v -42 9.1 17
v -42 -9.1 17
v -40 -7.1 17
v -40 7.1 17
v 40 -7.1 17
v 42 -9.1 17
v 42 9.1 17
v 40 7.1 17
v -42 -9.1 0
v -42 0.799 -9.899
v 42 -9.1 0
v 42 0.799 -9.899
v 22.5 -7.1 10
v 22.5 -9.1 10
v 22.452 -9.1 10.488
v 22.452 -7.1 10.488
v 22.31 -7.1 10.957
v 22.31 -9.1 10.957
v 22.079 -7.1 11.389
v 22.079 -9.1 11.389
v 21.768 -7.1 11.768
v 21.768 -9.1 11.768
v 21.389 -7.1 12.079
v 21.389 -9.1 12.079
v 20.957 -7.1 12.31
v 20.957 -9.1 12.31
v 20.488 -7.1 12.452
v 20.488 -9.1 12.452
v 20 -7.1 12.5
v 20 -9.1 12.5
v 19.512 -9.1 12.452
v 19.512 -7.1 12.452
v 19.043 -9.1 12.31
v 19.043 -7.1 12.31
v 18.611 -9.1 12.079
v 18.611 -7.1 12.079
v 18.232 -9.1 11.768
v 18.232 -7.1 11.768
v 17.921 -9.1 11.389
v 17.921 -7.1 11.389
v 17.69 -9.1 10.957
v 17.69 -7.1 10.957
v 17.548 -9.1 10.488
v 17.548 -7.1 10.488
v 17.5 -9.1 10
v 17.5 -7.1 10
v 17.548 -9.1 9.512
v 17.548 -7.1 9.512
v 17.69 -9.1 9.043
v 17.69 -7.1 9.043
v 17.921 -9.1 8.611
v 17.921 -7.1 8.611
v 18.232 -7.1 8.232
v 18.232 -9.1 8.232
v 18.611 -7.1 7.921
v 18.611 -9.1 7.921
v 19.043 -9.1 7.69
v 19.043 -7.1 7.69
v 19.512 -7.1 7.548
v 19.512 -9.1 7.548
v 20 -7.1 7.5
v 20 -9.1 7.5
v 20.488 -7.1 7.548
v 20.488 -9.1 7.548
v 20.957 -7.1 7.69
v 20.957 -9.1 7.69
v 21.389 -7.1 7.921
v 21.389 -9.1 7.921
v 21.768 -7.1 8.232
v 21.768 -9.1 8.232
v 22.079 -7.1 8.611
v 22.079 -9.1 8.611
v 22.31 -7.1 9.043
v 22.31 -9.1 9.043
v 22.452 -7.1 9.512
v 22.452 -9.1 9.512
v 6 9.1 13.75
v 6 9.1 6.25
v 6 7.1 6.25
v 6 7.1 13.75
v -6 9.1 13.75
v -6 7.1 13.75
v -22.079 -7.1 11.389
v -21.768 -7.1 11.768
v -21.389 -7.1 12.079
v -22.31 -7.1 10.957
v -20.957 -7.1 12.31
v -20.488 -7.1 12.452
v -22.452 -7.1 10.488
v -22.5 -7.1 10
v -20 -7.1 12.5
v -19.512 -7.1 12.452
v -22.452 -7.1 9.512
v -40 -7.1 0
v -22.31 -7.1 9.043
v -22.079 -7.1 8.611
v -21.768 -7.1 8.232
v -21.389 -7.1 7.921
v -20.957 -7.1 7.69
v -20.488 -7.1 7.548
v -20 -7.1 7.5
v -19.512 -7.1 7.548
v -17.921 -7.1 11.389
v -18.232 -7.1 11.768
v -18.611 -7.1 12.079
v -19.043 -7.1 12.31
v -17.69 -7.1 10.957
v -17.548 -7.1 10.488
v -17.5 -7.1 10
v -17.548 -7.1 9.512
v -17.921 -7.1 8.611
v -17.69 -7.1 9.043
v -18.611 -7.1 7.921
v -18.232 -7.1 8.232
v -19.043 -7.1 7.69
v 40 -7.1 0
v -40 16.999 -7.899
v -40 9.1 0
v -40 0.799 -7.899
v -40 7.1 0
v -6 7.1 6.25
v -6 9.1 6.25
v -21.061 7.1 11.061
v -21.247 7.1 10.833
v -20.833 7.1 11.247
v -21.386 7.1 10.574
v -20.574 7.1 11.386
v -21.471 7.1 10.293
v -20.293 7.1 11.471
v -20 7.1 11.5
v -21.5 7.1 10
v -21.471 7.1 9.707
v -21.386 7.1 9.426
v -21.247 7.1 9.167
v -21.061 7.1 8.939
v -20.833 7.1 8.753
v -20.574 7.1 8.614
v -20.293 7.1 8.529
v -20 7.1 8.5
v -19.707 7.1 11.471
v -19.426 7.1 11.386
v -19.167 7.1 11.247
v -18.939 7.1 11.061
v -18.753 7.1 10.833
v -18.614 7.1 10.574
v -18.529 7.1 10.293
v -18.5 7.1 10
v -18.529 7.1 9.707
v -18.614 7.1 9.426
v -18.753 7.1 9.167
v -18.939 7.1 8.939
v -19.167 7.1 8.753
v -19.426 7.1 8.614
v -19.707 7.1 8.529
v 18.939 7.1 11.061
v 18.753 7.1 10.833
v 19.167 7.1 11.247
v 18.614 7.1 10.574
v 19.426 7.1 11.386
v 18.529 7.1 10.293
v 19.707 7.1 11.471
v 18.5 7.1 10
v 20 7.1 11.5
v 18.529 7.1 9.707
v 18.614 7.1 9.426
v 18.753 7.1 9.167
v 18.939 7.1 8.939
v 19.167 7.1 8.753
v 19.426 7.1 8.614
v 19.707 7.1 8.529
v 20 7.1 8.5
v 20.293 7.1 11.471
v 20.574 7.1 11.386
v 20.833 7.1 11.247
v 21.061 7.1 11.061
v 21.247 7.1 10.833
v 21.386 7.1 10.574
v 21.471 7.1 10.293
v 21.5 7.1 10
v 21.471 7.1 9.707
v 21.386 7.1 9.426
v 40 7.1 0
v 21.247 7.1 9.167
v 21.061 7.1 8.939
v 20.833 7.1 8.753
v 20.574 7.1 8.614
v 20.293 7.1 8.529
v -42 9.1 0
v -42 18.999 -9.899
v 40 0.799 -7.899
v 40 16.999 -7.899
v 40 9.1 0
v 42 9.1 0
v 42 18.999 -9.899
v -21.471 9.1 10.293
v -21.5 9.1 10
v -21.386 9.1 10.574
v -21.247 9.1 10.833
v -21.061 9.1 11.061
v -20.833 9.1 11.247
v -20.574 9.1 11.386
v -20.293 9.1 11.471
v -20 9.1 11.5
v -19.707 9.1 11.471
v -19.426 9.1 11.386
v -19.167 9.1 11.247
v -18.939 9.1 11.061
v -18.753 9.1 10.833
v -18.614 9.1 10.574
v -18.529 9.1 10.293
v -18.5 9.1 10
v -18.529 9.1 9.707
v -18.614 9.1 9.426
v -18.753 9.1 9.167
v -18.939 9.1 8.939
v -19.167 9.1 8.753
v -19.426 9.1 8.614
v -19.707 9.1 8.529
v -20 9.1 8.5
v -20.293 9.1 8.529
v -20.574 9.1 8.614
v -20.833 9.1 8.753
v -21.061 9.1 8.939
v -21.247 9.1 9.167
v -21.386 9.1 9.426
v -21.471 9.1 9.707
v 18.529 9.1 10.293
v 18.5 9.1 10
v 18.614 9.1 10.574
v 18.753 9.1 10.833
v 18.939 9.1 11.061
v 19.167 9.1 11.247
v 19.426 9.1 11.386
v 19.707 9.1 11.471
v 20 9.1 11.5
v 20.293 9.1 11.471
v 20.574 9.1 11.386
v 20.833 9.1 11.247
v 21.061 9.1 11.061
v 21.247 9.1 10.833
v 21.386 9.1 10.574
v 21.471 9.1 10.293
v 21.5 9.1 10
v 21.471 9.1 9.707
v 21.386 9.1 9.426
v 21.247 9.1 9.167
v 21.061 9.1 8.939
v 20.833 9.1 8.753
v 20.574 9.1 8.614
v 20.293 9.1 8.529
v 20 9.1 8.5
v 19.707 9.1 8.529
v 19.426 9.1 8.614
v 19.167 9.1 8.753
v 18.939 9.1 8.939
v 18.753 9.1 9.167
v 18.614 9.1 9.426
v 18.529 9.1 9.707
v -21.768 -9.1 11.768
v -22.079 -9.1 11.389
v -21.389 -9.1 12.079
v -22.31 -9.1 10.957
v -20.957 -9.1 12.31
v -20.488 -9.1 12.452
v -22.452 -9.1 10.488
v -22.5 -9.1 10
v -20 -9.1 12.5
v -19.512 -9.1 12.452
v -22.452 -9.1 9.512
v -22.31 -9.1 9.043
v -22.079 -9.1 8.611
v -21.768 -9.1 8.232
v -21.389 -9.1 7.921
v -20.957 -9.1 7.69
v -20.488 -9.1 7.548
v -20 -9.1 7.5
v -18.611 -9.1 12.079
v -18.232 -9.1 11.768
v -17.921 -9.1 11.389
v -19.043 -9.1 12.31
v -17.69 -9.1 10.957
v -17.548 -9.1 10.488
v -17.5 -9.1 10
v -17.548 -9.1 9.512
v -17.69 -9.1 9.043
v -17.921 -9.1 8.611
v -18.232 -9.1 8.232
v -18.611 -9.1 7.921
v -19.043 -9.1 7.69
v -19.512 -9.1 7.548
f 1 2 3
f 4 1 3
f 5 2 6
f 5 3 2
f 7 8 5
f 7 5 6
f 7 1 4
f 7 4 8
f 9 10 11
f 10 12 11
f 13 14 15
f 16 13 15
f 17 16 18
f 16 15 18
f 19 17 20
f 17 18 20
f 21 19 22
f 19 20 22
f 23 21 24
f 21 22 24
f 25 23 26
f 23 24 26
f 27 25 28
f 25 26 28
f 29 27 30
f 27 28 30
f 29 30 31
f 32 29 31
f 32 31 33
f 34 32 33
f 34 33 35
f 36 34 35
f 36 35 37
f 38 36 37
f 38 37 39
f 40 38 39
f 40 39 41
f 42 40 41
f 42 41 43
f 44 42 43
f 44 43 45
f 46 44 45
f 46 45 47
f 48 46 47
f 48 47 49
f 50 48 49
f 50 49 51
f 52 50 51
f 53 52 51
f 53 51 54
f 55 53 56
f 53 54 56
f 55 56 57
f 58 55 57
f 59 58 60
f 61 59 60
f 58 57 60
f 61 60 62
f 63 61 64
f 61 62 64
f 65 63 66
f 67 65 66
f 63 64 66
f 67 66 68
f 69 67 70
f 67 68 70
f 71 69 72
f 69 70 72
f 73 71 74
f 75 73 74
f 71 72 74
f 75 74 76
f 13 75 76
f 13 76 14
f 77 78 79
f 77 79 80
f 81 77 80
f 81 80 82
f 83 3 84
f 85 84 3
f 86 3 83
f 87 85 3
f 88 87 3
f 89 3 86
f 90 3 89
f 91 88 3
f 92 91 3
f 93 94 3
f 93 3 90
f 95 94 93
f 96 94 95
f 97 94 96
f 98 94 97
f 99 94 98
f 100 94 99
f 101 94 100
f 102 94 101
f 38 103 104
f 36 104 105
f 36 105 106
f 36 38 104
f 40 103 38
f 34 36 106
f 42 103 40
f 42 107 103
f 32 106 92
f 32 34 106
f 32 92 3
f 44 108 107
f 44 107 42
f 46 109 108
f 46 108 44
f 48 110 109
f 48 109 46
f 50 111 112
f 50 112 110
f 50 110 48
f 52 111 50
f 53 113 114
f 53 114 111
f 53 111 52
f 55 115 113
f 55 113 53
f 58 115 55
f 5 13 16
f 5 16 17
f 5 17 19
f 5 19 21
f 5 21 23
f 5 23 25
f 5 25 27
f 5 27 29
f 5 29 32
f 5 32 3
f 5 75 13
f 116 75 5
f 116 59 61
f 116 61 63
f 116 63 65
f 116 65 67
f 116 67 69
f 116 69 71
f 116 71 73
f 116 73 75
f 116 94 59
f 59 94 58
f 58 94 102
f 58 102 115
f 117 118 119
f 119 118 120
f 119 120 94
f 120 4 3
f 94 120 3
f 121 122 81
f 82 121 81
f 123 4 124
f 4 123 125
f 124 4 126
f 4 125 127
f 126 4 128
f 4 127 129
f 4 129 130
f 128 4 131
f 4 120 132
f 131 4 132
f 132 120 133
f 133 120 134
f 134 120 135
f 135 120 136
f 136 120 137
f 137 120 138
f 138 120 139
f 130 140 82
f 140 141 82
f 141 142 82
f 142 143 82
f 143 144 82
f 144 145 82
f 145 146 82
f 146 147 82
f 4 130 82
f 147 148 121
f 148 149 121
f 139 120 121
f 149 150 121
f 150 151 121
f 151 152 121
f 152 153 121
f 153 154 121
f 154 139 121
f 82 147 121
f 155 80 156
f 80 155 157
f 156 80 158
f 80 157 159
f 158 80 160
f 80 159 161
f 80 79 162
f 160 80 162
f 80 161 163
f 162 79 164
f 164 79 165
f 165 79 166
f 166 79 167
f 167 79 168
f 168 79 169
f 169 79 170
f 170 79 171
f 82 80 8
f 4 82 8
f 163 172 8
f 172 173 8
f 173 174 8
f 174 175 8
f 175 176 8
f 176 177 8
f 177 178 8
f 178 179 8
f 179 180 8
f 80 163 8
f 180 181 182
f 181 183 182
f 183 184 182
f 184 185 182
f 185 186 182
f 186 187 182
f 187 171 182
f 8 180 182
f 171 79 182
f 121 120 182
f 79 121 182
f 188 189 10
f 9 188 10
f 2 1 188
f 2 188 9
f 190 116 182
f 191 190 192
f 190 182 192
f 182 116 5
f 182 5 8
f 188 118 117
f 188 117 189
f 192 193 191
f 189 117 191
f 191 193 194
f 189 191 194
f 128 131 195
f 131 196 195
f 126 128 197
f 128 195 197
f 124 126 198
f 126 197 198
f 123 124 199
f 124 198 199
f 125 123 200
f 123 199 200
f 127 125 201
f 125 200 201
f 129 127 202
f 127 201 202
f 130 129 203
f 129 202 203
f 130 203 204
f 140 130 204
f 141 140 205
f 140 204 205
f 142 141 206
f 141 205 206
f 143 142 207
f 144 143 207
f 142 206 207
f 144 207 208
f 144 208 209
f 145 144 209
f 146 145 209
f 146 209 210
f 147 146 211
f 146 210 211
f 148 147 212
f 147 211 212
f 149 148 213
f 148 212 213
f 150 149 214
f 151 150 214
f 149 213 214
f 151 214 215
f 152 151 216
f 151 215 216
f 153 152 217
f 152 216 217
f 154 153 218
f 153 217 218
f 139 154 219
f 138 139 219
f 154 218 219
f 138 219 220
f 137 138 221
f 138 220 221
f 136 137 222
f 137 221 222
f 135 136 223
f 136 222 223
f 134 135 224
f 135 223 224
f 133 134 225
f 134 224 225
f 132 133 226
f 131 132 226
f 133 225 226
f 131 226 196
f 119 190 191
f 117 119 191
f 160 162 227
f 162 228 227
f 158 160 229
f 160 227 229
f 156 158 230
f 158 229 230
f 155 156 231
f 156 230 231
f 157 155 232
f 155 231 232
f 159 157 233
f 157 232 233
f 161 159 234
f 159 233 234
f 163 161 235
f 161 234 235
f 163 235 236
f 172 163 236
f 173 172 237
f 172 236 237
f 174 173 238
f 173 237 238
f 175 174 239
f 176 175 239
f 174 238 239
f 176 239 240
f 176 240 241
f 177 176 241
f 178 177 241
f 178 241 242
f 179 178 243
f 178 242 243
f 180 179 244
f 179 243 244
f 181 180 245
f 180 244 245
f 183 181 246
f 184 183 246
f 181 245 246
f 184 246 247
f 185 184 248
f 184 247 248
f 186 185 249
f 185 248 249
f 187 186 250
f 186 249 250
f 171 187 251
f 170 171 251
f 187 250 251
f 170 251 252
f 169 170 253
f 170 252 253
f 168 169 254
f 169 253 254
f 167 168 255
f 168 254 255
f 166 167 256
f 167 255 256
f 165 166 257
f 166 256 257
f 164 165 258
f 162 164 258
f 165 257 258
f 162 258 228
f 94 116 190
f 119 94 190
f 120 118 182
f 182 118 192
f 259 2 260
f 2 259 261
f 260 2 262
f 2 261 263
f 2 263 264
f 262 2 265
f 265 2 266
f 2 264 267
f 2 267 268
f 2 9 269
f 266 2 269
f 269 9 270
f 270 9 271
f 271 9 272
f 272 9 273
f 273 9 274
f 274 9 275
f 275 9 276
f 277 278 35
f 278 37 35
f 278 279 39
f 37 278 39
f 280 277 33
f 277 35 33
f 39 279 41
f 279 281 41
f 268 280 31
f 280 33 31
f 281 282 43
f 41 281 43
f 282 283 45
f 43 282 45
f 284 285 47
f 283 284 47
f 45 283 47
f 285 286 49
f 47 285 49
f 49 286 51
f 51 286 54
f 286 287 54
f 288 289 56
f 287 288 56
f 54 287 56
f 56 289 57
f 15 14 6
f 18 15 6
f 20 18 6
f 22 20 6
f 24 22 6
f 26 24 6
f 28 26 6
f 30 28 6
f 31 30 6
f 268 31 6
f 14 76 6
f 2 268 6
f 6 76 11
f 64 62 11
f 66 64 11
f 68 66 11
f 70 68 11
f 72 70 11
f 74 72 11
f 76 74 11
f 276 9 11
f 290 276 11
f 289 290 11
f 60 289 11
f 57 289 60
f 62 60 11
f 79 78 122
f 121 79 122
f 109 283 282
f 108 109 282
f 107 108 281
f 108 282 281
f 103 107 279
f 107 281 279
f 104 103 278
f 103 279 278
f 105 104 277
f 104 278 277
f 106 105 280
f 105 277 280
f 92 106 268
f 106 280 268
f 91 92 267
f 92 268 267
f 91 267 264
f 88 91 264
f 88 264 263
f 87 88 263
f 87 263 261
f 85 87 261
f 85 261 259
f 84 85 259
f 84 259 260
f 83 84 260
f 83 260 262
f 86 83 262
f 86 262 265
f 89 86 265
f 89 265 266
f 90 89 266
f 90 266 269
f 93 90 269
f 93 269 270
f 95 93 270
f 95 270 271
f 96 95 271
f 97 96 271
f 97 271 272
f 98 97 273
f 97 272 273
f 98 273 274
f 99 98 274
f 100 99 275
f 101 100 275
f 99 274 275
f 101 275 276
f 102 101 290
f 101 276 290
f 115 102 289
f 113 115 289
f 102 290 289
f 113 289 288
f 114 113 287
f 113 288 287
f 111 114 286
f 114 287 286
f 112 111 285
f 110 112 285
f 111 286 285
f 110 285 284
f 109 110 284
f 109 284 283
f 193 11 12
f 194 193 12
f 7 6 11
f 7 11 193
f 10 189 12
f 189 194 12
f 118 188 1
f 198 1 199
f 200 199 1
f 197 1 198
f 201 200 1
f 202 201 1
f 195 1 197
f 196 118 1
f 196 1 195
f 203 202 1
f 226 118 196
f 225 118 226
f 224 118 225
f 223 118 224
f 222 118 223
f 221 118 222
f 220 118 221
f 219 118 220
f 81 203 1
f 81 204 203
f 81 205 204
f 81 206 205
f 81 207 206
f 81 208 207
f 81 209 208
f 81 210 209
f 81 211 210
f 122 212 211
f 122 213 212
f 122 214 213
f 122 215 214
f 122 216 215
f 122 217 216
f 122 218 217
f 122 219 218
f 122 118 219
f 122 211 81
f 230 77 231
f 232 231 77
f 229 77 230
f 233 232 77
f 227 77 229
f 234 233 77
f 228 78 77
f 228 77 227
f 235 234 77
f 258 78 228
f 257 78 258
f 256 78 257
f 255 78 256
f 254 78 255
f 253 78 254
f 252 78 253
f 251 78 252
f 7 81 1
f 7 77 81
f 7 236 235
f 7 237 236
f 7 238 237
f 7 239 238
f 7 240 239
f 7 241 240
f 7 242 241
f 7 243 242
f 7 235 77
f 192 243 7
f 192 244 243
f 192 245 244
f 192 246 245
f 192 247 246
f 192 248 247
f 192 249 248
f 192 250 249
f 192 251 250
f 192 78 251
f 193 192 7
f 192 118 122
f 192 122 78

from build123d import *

# Parameters (mm, degrees)
F0_W           = 84
F0_H           = 18.2
F0_W_2         = 80
F0_H_2         = 14.2
F1_DEPTH       = 17
F3_D           = 3
F3_CBORE_D     = 5
F3_CBORE_DEPTH = 5
F4_W           = 12
F4_H           = 7.5
F5_DEPTH       = 2
F7_DEPTH       = 2
F9_DEPTH       = 2
F11_DEPTH      = 80
F13_DEPTH      = 80


with BuildPart() as f1:
    # F0 (on Top) → F1 (new body)
    with BuildSketch(Plane.XY):
        Rectangle(F0_W, F0_H)
        Rectangle(F0_W_2, F0_H_2, mode=Mode.SUBTRACT)
    extrude(amount=F1_DEPTH)

    # F3 (through all)
    with Locations(Plane.XZ.offset(9.1)):
        with Locations((-20, 10), (20, 10)):
            CounterBoreHole(F3_D / 2, F3_CBORE_D / 2, F3_CBORE_DEPTH)

    # F4 (on face) → F5 (cut)
    with BuildSketch(Plane(origin=(0, 9.1, 0), x_dir=(-1, 0, 0), z_dir=(0, 1, 0))):
        with Locations((0, 10)):
            Rectangle(F4_W, F4_H)
    extrude(amount=-F5_DEPTH, mode=Mode.SUBTRACT)

    # F6 (on face) → F7 (join)
    with BuildSketch(Plane(origin=(-42, 0, 0), x_dir=(0, -1, 0), z_dir=(-1, 0, 0))):
        Polygon((9.1, 0), (-9.1, 0), (-18.999495, -9.899495), (-0.799495, -9.899495), align=None)
    extrude(amount=-F7_DEPTH)

    # F8 (on face) → F9 (join)
    with BuildSketch(Plane.YZ.offset(42)):
        Polygon((9.1, 0), (-9.1, 0), (0.799495, -9.899495), (18.999495, -9.899495), align=None)
    extrude(amount=-F9_DEPTH)

    # F10 (on face) → F11 (join)
    with BuildSketch(Plane(origin=(40, 0, 0), x_dir=(0, -1, 0), z_dir=(-1, 0, 0))):
        Polygon((9.1, 0), (7.1, 0), (-2.799495, -9.899495), (-0.799495, -9.899495), align=None)
    extrude(amount=F11_DEPTH)

    # F12 (on face) → F13 (join)
    with BuildSketch(Plane(origin=(40, 0, 0), x_dir=(0, -1, 0), z_dir=(-1, 0, 0))):
        Polygon((-0.799495, -7.899495), (-16.999495, -7.899495), (-18.999495, -9.899495), (-2.799495, -9.899495), align=None)
    extrude(amount=F13_DEPTH)


solid = f1.part
